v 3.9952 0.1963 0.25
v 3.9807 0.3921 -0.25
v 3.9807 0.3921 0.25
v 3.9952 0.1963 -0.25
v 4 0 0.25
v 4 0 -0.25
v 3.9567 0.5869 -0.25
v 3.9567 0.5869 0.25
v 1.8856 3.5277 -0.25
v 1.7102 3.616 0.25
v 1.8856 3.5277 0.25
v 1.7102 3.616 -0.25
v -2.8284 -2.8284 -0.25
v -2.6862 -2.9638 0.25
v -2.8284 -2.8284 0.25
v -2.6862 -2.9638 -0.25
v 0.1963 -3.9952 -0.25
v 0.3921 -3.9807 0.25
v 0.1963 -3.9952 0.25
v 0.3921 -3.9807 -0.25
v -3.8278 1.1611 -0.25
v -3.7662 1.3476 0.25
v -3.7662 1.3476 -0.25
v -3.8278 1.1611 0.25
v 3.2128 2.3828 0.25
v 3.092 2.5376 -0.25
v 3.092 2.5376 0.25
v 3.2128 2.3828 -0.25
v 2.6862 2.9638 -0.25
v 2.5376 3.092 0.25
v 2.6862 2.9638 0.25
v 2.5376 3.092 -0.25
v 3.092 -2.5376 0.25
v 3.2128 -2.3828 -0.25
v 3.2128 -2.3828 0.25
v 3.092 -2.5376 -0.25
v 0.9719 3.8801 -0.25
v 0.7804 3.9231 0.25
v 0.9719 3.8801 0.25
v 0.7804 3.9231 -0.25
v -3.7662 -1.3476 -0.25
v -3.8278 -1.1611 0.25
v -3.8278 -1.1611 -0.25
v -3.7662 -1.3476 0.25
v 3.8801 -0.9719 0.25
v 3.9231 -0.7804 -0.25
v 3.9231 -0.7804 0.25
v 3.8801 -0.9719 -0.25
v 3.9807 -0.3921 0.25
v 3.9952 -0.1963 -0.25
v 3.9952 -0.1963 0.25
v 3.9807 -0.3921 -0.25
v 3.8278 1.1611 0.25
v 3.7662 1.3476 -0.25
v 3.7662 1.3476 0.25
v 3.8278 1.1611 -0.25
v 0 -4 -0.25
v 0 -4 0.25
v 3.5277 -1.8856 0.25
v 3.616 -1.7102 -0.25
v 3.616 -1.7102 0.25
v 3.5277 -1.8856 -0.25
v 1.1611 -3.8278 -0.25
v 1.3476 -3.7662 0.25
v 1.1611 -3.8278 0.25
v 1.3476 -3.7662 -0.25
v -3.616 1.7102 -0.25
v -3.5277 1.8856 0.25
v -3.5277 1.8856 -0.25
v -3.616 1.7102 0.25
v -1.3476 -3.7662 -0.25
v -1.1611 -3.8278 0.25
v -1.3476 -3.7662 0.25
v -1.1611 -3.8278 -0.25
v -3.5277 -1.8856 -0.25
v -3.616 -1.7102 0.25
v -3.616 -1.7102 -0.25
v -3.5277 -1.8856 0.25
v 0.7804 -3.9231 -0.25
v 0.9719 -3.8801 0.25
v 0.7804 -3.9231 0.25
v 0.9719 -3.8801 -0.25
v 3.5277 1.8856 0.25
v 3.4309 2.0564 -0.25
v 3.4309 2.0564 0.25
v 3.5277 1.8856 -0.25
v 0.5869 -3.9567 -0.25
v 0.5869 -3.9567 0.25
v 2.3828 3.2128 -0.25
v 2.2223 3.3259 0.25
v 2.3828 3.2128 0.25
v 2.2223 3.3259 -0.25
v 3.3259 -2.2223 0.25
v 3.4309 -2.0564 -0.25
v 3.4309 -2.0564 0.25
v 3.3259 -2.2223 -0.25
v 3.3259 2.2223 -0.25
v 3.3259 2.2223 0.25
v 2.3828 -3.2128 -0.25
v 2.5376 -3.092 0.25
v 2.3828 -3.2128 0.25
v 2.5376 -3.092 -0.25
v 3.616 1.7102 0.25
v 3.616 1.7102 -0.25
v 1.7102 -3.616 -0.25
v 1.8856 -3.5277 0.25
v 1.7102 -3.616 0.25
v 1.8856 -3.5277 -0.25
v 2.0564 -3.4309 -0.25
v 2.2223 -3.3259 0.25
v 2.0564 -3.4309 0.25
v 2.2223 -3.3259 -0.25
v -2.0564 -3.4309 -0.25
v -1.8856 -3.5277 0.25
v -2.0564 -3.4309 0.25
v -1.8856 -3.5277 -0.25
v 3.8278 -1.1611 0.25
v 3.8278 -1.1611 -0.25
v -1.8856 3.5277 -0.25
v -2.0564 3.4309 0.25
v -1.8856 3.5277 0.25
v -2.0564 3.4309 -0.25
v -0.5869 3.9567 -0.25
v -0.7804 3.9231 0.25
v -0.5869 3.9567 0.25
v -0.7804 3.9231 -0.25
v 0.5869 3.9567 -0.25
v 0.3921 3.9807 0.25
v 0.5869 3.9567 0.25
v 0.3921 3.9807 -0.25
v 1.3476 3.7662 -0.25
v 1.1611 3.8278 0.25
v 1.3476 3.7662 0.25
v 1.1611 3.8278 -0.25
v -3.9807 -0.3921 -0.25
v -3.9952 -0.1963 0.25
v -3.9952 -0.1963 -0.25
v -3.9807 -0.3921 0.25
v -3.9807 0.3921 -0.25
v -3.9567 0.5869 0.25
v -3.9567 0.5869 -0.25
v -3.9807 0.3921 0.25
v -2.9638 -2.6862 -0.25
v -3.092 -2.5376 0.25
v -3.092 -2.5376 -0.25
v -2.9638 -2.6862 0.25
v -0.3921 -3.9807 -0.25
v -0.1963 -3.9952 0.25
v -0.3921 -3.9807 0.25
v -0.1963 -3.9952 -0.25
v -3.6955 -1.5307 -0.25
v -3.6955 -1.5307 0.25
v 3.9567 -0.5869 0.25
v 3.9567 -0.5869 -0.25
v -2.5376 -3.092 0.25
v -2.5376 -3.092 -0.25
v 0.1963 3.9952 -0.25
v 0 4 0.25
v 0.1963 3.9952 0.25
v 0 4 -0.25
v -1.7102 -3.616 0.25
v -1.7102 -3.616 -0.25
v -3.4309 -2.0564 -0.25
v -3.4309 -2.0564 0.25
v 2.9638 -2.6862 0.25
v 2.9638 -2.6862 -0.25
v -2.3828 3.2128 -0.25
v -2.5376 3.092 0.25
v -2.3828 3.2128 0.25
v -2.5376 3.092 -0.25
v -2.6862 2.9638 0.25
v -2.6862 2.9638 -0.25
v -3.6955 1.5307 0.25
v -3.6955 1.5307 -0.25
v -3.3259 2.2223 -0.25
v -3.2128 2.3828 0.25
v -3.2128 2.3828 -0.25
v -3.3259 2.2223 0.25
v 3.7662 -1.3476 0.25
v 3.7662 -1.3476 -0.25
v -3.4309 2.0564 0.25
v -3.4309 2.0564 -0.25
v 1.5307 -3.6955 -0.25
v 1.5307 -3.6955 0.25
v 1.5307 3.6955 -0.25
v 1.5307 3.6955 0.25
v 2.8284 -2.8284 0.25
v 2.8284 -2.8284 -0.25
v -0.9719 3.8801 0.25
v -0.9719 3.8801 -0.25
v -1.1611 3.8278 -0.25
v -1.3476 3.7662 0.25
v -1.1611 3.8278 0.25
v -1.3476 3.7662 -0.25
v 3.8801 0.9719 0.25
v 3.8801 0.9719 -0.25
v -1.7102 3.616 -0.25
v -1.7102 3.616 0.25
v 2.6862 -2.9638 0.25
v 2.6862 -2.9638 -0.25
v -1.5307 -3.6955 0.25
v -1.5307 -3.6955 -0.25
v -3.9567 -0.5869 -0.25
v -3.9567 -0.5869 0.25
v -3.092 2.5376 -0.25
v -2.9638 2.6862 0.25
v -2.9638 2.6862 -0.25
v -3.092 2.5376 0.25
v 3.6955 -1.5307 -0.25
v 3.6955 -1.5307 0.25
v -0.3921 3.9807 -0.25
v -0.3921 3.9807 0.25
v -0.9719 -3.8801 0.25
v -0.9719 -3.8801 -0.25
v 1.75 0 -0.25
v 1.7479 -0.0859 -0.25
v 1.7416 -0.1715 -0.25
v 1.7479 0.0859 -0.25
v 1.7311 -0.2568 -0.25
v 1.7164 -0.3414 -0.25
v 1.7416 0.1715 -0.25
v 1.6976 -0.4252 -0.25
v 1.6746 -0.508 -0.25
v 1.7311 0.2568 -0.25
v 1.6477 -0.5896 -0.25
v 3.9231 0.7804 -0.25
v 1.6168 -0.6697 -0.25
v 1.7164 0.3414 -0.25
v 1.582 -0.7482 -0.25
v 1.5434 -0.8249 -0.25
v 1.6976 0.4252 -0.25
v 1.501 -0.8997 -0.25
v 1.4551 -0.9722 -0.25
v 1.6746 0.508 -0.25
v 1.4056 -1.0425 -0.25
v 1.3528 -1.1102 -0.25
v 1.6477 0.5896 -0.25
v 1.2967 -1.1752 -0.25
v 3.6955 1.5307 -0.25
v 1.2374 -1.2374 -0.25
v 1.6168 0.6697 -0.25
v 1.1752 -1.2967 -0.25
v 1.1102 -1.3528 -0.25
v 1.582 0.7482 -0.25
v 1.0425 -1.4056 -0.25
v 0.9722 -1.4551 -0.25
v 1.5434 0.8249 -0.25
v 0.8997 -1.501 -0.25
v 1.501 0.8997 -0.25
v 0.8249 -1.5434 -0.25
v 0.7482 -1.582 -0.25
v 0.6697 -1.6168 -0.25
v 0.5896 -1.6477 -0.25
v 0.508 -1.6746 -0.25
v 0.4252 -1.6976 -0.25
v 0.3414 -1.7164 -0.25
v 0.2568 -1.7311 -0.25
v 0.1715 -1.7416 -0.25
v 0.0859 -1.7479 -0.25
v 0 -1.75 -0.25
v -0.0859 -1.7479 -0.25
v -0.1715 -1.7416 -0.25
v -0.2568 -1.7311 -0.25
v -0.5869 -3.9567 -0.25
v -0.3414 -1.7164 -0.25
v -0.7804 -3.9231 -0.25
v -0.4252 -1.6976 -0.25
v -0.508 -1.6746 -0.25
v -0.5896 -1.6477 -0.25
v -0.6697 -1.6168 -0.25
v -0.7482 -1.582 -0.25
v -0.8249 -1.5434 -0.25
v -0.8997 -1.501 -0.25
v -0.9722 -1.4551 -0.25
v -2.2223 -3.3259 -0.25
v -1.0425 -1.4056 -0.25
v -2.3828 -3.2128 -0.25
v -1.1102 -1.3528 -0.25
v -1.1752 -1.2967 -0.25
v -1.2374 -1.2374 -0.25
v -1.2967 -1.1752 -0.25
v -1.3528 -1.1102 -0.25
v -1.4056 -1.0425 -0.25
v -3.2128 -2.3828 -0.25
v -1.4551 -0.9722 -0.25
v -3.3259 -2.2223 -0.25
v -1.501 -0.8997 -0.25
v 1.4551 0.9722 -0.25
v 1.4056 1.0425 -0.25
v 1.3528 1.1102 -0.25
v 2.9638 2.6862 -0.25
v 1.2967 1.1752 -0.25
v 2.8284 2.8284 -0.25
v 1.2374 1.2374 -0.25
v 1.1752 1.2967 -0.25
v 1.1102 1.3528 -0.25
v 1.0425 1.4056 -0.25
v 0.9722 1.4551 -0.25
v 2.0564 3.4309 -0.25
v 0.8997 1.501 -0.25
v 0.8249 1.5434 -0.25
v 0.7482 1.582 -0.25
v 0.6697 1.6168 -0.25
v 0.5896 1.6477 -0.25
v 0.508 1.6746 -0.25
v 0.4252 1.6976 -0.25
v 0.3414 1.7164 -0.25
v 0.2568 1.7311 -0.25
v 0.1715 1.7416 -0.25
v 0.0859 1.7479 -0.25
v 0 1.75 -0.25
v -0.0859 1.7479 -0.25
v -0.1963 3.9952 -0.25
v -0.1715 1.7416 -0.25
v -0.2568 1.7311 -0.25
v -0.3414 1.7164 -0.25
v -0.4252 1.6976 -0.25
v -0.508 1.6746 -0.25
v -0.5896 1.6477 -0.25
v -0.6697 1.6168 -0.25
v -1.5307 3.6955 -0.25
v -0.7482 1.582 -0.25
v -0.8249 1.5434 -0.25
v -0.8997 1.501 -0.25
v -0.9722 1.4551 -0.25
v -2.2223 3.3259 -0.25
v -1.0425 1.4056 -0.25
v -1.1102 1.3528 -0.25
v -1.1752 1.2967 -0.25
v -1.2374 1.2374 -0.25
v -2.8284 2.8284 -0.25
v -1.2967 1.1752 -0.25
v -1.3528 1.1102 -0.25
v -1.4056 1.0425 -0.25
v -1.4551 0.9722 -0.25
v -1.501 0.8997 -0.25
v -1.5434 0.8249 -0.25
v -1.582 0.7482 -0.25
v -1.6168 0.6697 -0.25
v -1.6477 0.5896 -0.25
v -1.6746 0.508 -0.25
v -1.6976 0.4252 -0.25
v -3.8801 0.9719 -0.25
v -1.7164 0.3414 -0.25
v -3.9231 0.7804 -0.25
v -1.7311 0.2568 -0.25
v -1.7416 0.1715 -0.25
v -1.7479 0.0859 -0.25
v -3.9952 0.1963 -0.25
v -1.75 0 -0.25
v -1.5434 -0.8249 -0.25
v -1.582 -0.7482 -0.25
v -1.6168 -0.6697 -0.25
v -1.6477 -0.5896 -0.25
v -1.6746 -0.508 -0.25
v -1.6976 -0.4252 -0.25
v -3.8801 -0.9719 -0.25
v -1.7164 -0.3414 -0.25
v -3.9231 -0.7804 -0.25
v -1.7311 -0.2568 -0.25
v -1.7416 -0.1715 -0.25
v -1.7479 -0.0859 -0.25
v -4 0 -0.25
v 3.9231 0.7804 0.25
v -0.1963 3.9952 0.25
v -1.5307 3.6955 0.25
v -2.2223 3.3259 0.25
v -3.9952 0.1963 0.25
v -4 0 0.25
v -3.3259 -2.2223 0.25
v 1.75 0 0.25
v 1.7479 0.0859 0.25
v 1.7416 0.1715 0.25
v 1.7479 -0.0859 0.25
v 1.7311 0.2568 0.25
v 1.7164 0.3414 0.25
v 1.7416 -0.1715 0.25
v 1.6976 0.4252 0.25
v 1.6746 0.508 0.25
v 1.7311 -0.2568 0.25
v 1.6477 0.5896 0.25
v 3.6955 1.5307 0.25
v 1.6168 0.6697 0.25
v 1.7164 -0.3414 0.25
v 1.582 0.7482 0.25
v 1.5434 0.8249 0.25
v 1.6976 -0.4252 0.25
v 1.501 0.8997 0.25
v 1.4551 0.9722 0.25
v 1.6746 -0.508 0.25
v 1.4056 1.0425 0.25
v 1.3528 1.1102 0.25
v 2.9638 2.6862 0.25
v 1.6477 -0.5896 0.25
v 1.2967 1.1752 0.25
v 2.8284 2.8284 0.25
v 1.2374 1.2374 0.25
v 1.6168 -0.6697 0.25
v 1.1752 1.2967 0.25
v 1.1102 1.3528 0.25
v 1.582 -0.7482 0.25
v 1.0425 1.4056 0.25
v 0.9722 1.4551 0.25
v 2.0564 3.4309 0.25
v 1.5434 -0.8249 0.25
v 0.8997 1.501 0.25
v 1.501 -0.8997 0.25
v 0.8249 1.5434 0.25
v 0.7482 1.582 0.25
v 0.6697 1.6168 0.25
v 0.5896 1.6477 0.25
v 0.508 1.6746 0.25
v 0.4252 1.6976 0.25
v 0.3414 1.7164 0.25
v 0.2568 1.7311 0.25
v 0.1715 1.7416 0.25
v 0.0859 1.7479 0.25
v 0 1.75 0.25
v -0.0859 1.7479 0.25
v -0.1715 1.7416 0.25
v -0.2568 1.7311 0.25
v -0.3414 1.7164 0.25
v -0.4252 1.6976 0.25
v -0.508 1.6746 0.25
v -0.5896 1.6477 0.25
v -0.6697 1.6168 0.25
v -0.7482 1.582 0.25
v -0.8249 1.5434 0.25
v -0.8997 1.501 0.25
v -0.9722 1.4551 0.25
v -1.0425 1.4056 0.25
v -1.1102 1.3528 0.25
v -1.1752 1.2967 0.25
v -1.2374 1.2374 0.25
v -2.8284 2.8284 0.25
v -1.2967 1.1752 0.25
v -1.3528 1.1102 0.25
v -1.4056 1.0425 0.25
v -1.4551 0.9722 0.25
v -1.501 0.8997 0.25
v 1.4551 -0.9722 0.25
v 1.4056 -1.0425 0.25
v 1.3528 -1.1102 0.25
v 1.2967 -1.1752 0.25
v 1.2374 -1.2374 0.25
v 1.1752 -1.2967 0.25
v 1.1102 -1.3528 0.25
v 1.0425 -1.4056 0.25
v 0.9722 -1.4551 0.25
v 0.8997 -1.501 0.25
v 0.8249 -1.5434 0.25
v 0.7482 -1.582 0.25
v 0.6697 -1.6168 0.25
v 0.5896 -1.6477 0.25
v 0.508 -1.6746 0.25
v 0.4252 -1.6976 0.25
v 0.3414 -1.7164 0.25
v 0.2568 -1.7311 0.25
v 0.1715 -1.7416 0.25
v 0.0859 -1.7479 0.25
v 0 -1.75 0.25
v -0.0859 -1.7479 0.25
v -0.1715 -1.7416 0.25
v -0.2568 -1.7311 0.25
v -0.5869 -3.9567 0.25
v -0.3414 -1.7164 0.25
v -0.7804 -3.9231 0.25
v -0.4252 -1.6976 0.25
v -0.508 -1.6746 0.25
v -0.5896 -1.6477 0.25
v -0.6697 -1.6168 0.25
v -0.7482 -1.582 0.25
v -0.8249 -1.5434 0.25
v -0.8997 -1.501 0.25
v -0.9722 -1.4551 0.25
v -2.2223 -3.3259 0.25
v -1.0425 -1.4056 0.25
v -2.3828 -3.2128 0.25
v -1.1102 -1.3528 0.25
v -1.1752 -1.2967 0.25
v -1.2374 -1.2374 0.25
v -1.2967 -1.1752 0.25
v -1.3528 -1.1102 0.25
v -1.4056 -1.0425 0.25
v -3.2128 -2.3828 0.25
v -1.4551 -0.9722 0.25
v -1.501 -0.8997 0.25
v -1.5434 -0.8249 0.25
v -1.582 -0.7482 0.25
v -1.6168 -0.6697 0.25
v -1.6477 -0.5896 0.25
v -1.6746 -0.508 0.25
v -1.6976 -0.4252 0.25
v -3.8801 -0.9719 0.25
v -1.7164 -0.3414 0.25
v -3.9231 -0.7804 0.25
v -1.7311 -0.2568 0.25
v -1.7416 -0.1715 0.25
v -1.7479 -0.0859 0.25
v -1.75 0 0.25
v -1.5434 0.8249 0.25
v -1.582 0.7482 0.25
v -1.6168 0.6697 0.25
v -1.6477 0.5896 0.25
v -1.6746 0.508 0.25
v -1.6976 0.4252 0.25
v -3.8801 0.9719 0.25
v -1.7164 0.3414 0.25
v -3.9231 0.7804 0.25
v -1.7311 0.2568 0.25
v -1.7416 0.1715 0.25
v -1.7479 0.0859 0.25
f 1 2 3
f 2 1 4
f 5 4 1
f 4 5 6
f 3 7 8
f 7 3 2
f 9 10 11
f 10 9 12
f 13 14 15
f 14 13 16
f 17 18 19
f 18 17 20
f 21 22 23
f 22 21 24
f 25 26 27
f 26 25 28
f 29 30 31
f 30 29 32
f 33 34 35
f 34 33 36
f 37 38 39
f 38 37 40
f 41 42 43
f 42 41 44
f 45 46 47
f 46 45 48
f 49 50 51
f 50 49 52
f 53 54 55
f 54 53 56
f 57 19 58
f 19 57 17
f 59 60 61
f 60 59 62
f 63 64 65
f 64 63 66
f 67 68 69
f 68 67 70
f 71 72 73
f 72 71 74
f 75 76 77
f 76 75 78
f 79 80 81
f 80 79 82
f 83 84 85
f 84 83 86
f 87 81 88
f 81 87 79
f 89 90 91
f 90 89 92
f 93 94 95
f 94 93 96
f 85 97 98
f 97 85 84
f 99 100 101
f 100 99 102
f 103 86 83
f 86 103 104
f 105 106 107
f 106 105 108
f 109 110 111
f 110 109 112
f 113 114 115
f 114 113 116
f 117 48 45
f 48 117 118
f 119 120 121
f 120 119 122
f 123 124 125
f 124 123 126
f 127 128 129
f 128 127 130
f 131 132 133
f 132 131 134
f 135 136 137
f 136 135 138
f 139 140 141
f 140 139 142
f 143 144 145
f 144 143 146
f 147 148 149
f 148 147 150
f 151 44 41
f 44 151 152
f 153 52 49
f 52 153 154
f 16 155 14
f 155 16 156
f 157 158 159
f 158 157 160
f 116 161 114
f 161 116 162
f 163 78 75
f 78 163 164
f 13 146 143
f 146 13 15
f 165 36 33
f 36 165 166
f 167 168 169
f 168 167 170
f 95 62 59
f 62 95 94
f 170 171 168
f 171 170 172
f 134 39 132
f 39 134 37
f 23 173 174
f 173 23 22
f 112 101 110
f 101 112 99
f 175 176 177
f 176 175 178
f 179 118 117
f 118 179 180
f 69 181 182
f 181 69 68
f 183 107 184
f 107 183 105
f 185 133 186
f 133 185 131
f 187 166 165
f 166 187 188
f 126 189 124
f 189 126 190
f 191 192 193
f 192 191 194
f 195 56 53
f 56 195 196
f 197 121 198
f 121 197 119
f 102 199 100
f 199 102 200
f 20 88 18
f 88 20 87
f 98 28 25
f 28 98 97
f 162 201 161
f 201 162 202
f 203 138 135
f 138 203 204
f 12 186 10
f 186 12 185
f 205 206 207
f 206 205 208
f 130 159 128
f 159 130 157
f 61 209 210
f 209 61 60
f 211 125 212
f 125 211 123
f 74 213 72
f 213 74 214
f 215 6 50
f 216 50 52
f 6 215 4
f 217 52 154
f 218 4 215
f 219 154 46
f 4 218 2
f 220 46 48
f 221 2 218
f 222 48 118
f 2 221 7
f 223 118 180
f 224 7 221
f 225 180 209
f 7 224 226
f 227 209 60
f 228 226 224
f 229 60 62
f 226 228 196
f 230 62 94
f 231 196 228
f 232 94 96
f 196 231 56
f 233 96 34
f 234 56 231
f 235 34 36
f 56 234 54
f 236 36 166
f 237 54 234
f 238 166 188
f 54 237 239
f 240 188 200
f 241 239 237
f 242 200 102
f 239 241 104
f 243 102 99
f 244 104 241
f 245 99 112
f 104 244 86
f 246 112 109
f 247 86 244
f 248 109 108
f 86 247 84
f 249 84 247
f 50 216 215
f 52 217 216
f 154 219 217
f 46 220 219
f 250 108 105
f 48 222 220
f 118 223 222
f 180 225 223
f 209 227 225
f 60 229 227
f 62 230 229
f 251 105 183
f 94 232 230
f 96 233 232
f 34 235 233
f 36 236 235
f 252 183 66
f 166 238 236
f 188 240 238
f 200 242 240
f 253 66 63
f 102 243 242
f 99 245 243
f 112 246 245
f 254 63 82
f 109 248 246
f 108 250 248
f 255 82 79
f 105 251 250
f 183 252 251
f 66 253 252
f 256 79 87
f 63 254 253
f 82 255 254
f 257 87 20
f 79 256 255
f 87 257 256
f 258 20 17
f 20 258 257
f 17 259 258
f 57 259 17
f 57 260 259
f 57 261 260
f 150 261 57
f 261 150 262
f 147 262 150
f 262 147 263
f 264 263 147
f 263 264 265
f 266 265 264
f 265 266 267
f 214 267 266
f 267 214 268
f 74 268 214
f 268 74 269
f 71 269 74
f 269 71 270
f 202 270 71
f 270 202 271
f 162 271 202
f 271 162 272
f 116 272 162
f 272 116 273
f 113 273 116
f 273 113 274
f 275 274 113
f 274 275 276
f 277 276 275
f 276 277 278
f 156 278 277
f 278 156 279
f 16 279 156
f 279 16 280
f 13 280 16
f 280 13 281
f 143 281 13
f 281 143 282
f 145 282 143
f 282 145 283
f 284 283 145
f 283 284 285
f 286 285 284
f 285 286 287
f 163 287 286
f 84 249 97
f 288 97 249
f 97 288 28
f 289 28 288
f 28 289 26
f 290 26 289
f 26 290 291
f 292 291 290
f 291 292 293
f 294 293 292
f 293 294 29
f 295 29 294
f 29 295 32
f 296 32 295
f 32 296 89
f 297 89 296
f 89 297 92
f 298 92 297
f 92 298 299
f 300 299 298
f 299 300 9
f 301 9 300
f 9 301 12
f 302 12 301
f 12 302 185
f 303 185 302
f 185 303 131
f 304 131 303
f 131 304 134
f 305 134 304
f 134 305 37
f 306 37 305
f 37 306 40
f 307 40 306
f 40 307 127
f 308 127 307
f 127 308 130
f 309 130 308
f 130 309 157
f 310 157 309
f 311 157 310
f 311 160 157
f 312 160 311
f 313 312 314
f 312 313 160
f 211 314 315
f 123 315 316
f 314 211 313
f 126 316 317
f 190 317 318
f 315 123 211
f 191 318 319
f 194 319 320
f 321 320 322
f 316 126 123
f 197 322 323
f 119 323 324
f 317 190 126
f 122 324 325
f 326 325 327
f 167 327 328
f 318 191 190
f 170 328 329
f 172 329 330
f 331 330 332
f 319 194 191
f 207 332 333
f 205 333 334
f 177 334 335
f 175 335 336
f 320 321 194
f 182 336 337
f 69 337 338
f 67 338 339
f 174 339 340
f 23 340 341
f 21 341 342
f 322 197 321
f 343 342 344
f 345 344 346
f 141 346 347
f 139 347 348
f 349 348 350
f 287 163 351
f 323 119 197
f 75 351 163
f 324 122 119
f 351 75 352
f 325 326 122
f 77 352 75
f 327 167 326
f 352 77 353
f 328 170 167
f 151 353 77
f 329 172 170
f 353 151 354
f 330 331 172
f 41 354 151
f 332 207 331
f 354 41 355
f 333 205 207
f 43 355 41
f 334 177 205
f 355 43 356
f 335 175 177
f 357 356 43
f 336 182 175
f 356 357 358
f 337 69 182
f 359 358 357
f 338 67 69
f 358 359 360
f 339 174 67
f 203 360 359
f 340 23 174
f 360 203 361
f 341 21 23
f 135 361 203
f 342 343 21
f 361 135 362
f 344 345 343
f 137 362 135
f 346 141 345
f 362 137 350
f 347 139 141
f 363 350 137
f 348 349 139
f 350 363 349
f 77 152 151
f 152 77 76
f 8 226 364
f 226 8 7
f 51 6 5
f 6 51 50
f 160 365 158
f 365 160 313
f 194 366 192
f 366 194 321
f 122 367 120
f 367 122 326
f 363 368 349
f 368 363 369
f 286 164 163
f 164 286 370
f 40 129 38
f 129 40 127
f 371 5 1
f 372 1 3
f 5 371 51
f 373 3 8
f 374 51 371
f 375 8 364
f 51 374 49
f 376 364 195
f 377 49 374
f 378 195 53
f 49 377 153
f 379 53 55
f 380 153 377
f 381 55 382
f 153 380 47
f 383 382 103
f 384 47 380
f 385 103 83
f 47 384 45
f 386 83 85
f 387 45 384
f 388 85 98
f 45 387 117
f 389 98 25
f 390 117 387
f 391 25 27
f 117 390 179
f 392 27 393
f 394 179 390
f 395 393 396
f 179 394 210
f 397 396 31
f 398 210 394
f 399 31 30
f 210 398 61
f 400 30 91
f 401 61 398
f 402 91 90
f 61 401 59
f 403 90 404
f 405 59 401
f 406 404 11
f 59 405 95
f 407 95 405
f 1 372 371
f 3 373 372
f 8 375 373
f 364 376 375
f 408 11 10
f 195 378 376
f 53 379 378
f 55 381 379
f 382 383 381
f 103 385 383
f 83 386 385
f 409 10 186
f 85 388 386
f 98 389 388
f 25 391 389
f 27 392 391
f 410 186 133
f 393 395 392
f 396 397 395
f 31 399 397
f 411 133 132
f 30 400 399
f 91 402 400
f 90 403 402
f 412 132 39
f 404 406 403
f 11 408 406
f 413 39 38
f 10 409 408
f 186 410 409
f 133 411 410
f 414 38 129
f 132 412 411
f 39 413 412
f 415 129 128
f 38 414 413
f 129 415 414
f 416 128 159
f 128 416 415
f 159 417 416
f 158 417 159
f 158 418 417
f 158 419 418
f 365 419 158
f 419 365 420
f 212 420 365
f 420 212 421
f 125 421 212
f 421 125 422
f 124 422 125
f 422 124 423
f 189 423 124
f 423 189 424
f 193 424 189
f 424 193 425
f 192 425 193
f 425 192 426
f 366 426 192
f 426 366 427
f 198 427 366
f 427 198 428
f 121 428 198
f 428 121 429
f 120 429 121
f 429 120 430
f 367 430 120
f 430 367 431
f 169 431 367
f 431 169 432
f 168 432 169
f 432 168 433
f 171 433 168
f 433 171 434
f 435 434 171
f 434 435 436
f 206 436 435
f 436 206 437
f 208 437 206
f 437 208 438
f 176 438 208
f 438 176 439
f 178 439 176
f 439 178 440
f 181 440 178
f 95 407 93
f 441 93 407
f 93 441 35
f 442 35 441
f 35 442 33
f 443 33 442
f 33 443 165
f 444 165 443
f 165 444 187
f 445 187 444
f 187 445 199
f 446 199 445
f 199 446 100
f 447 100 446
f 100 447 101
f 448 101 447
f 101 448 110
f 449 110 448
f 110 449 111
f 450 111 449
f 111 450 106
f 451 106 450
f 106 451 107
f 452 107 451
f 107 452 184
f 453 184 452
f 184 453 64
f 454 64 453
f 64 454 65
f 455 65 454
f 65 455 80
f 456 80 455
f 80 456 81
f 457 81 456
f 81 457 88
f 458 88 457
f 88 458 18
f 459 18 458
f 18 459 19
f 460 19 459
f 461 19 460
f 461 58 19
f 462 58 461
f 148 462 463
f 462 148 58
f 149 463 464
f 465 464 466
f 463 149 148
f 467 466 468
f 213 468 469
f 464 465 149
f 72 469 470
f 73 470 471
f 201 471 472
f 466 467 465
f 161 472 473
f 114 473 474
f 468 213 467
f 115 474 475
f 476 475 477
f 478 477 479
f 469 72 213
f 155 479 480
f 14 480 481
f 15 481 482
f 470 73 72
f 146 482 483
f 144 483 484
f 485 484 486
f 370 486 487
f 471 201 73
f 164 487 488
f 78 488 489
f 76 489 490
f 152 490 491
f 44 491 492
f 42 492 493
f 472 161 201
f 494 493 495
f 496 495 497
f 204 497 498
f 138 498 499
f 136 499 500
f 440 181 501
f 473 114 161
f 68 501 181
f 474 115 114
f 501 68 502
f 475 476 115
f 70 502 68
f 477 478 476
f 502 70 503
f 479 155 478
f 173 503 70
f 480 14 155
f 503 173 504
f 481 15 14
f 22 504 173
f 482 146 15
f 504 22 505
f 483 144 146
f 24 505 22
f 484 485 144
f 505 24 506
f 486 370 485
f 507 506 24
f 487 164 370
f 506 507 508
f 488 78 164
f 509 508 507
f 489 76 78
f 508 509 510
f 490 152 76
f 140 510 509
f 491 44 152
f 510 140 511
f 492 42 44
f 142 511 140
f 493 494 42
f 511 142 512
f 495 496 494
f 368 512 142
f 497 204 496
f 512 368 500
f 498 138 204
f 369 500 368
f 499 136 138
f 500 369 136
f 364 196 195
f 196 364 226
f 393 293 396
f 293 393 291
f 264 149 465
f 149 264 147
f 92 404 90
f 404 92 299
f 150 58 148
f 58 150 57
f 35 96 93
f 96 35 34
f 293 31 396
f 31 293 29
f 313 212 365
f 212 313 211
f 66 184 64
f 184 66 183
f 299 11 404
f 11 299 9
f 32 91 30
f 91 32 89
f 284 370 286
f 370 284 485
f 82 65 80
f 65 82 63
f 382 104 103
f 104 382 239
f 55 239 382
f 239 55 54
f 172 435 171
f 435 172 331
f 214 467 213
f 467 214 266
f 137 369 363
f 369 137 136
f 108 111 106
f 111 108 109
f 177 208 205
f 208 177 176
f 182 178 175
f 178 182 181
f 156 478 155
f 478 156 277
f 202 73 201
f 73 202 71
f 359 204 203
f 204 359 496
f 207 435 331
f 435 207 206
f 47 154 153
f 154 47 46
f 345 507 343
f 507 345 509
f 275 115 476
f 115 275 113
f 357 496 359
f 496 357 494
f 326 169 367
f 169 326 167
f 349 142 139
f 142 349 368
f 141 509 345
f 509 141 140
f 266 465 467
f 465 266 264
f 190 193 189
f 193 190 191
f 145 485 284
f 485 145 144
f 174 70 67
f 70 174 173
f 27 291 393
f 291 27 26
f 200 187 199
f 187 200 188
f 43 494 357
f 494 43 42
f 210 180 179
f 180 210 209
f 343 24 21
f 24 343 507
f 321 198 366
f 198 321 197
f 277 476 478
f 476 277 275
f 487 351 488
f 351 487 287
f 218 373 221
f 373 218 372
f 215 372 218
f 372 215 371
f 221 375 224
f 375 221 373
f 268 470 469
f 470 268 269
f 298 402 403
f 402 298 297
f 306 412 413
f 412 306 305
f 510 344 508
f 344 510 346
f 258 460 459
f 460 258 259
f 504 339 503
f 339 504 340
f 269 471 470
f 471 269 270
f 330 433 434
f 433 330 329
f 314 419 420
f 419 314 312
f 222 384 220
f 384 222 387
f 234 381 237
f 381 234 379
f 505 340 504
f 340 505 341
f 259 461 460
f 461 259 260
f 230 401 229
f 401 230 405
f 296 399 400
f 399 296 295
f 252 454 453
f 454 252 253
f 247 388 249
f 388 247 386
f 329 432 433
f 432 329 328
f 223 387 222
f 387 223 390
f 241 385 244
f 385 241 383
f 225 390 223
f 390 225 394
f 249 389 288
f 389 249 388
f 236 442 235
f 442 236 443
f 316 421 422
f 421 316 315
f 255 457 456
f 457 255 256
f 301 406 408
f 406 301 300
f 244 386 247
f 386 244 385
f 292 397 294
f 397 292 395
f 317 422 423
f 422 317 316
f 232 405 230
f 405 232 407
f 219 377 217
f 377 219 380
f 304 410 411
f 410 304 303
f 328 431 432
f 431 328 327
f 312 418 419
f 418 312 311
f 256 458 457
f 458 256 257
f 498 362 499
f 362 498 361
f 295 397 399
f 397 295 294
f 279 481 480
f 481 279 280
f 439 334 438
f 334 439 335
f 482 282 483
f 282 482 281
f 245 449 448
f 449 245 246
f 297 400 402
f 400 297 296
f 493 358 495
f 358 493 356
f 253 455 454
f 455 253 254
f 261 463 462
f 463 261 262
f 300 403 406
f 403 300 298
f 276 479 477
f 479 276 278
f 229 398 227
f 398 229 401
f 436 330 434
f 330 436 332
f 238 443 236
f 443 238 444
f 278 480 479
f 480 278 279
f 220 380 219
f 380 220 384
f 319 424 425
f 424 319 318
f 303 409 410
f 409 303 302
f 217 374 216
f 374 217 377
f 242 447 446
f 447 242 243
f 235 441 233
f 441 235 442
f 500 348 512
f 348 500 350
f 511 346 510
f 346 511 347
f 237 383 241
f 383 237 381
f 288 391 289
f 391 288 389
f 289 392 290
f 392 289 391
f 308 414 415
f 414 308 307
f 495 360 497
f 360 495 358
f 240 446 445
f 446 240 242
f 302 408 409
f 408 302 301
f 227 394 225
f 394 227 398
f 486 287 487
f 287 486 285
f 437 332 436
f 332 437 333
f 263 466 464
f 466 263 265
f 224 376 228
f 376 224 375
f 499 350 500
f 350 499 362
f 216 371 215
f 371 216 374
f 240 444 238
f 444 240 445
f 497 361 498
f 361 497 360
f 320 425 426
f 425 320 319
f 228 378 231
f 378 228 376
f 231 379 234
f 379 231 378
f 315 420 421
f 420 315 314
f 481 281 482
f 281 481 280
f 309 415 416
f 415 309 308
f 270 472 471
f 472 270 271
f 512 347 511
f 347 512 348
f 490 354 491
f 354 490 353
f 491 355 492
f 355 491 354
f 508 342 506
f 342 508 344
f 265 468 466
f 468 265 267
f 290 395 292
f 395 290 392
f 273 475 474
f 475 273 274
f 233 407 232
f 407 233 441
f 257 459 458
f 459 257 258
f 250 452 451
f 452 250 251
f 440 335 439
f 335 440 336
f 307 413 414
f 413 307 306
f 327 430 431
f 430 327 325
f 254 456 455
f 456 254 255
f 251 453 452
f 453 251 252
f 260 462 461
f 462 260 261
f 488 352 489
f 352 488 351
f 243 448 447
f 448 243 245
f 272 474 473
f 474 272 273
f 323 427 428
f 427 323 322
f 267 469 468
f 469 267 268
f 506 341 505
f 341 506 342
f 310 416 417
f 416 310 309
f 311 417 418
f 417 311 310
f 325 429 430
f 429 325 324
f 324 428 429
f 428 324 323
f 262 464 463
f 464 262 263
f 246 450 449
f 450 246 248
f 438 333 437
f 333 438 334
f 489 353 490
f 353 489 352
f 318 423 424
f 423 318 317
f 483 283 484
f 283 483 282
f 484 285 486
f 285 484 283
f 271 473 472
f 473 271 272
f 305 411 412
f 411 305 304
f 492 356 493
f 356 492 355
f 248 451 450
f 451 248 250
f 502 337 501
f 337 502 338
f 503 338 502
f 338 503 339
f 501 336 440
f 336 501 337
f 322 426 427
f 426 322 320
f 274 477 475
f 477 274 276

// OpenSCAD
$fn=128;

module washer(id=3.5, od=8.0, t=0.5){
    difference(){
        cylinder(h=t, d=od, center=true);
        cylinder(h=t+0.2, d=id, center=true);
    }
}

washer();
